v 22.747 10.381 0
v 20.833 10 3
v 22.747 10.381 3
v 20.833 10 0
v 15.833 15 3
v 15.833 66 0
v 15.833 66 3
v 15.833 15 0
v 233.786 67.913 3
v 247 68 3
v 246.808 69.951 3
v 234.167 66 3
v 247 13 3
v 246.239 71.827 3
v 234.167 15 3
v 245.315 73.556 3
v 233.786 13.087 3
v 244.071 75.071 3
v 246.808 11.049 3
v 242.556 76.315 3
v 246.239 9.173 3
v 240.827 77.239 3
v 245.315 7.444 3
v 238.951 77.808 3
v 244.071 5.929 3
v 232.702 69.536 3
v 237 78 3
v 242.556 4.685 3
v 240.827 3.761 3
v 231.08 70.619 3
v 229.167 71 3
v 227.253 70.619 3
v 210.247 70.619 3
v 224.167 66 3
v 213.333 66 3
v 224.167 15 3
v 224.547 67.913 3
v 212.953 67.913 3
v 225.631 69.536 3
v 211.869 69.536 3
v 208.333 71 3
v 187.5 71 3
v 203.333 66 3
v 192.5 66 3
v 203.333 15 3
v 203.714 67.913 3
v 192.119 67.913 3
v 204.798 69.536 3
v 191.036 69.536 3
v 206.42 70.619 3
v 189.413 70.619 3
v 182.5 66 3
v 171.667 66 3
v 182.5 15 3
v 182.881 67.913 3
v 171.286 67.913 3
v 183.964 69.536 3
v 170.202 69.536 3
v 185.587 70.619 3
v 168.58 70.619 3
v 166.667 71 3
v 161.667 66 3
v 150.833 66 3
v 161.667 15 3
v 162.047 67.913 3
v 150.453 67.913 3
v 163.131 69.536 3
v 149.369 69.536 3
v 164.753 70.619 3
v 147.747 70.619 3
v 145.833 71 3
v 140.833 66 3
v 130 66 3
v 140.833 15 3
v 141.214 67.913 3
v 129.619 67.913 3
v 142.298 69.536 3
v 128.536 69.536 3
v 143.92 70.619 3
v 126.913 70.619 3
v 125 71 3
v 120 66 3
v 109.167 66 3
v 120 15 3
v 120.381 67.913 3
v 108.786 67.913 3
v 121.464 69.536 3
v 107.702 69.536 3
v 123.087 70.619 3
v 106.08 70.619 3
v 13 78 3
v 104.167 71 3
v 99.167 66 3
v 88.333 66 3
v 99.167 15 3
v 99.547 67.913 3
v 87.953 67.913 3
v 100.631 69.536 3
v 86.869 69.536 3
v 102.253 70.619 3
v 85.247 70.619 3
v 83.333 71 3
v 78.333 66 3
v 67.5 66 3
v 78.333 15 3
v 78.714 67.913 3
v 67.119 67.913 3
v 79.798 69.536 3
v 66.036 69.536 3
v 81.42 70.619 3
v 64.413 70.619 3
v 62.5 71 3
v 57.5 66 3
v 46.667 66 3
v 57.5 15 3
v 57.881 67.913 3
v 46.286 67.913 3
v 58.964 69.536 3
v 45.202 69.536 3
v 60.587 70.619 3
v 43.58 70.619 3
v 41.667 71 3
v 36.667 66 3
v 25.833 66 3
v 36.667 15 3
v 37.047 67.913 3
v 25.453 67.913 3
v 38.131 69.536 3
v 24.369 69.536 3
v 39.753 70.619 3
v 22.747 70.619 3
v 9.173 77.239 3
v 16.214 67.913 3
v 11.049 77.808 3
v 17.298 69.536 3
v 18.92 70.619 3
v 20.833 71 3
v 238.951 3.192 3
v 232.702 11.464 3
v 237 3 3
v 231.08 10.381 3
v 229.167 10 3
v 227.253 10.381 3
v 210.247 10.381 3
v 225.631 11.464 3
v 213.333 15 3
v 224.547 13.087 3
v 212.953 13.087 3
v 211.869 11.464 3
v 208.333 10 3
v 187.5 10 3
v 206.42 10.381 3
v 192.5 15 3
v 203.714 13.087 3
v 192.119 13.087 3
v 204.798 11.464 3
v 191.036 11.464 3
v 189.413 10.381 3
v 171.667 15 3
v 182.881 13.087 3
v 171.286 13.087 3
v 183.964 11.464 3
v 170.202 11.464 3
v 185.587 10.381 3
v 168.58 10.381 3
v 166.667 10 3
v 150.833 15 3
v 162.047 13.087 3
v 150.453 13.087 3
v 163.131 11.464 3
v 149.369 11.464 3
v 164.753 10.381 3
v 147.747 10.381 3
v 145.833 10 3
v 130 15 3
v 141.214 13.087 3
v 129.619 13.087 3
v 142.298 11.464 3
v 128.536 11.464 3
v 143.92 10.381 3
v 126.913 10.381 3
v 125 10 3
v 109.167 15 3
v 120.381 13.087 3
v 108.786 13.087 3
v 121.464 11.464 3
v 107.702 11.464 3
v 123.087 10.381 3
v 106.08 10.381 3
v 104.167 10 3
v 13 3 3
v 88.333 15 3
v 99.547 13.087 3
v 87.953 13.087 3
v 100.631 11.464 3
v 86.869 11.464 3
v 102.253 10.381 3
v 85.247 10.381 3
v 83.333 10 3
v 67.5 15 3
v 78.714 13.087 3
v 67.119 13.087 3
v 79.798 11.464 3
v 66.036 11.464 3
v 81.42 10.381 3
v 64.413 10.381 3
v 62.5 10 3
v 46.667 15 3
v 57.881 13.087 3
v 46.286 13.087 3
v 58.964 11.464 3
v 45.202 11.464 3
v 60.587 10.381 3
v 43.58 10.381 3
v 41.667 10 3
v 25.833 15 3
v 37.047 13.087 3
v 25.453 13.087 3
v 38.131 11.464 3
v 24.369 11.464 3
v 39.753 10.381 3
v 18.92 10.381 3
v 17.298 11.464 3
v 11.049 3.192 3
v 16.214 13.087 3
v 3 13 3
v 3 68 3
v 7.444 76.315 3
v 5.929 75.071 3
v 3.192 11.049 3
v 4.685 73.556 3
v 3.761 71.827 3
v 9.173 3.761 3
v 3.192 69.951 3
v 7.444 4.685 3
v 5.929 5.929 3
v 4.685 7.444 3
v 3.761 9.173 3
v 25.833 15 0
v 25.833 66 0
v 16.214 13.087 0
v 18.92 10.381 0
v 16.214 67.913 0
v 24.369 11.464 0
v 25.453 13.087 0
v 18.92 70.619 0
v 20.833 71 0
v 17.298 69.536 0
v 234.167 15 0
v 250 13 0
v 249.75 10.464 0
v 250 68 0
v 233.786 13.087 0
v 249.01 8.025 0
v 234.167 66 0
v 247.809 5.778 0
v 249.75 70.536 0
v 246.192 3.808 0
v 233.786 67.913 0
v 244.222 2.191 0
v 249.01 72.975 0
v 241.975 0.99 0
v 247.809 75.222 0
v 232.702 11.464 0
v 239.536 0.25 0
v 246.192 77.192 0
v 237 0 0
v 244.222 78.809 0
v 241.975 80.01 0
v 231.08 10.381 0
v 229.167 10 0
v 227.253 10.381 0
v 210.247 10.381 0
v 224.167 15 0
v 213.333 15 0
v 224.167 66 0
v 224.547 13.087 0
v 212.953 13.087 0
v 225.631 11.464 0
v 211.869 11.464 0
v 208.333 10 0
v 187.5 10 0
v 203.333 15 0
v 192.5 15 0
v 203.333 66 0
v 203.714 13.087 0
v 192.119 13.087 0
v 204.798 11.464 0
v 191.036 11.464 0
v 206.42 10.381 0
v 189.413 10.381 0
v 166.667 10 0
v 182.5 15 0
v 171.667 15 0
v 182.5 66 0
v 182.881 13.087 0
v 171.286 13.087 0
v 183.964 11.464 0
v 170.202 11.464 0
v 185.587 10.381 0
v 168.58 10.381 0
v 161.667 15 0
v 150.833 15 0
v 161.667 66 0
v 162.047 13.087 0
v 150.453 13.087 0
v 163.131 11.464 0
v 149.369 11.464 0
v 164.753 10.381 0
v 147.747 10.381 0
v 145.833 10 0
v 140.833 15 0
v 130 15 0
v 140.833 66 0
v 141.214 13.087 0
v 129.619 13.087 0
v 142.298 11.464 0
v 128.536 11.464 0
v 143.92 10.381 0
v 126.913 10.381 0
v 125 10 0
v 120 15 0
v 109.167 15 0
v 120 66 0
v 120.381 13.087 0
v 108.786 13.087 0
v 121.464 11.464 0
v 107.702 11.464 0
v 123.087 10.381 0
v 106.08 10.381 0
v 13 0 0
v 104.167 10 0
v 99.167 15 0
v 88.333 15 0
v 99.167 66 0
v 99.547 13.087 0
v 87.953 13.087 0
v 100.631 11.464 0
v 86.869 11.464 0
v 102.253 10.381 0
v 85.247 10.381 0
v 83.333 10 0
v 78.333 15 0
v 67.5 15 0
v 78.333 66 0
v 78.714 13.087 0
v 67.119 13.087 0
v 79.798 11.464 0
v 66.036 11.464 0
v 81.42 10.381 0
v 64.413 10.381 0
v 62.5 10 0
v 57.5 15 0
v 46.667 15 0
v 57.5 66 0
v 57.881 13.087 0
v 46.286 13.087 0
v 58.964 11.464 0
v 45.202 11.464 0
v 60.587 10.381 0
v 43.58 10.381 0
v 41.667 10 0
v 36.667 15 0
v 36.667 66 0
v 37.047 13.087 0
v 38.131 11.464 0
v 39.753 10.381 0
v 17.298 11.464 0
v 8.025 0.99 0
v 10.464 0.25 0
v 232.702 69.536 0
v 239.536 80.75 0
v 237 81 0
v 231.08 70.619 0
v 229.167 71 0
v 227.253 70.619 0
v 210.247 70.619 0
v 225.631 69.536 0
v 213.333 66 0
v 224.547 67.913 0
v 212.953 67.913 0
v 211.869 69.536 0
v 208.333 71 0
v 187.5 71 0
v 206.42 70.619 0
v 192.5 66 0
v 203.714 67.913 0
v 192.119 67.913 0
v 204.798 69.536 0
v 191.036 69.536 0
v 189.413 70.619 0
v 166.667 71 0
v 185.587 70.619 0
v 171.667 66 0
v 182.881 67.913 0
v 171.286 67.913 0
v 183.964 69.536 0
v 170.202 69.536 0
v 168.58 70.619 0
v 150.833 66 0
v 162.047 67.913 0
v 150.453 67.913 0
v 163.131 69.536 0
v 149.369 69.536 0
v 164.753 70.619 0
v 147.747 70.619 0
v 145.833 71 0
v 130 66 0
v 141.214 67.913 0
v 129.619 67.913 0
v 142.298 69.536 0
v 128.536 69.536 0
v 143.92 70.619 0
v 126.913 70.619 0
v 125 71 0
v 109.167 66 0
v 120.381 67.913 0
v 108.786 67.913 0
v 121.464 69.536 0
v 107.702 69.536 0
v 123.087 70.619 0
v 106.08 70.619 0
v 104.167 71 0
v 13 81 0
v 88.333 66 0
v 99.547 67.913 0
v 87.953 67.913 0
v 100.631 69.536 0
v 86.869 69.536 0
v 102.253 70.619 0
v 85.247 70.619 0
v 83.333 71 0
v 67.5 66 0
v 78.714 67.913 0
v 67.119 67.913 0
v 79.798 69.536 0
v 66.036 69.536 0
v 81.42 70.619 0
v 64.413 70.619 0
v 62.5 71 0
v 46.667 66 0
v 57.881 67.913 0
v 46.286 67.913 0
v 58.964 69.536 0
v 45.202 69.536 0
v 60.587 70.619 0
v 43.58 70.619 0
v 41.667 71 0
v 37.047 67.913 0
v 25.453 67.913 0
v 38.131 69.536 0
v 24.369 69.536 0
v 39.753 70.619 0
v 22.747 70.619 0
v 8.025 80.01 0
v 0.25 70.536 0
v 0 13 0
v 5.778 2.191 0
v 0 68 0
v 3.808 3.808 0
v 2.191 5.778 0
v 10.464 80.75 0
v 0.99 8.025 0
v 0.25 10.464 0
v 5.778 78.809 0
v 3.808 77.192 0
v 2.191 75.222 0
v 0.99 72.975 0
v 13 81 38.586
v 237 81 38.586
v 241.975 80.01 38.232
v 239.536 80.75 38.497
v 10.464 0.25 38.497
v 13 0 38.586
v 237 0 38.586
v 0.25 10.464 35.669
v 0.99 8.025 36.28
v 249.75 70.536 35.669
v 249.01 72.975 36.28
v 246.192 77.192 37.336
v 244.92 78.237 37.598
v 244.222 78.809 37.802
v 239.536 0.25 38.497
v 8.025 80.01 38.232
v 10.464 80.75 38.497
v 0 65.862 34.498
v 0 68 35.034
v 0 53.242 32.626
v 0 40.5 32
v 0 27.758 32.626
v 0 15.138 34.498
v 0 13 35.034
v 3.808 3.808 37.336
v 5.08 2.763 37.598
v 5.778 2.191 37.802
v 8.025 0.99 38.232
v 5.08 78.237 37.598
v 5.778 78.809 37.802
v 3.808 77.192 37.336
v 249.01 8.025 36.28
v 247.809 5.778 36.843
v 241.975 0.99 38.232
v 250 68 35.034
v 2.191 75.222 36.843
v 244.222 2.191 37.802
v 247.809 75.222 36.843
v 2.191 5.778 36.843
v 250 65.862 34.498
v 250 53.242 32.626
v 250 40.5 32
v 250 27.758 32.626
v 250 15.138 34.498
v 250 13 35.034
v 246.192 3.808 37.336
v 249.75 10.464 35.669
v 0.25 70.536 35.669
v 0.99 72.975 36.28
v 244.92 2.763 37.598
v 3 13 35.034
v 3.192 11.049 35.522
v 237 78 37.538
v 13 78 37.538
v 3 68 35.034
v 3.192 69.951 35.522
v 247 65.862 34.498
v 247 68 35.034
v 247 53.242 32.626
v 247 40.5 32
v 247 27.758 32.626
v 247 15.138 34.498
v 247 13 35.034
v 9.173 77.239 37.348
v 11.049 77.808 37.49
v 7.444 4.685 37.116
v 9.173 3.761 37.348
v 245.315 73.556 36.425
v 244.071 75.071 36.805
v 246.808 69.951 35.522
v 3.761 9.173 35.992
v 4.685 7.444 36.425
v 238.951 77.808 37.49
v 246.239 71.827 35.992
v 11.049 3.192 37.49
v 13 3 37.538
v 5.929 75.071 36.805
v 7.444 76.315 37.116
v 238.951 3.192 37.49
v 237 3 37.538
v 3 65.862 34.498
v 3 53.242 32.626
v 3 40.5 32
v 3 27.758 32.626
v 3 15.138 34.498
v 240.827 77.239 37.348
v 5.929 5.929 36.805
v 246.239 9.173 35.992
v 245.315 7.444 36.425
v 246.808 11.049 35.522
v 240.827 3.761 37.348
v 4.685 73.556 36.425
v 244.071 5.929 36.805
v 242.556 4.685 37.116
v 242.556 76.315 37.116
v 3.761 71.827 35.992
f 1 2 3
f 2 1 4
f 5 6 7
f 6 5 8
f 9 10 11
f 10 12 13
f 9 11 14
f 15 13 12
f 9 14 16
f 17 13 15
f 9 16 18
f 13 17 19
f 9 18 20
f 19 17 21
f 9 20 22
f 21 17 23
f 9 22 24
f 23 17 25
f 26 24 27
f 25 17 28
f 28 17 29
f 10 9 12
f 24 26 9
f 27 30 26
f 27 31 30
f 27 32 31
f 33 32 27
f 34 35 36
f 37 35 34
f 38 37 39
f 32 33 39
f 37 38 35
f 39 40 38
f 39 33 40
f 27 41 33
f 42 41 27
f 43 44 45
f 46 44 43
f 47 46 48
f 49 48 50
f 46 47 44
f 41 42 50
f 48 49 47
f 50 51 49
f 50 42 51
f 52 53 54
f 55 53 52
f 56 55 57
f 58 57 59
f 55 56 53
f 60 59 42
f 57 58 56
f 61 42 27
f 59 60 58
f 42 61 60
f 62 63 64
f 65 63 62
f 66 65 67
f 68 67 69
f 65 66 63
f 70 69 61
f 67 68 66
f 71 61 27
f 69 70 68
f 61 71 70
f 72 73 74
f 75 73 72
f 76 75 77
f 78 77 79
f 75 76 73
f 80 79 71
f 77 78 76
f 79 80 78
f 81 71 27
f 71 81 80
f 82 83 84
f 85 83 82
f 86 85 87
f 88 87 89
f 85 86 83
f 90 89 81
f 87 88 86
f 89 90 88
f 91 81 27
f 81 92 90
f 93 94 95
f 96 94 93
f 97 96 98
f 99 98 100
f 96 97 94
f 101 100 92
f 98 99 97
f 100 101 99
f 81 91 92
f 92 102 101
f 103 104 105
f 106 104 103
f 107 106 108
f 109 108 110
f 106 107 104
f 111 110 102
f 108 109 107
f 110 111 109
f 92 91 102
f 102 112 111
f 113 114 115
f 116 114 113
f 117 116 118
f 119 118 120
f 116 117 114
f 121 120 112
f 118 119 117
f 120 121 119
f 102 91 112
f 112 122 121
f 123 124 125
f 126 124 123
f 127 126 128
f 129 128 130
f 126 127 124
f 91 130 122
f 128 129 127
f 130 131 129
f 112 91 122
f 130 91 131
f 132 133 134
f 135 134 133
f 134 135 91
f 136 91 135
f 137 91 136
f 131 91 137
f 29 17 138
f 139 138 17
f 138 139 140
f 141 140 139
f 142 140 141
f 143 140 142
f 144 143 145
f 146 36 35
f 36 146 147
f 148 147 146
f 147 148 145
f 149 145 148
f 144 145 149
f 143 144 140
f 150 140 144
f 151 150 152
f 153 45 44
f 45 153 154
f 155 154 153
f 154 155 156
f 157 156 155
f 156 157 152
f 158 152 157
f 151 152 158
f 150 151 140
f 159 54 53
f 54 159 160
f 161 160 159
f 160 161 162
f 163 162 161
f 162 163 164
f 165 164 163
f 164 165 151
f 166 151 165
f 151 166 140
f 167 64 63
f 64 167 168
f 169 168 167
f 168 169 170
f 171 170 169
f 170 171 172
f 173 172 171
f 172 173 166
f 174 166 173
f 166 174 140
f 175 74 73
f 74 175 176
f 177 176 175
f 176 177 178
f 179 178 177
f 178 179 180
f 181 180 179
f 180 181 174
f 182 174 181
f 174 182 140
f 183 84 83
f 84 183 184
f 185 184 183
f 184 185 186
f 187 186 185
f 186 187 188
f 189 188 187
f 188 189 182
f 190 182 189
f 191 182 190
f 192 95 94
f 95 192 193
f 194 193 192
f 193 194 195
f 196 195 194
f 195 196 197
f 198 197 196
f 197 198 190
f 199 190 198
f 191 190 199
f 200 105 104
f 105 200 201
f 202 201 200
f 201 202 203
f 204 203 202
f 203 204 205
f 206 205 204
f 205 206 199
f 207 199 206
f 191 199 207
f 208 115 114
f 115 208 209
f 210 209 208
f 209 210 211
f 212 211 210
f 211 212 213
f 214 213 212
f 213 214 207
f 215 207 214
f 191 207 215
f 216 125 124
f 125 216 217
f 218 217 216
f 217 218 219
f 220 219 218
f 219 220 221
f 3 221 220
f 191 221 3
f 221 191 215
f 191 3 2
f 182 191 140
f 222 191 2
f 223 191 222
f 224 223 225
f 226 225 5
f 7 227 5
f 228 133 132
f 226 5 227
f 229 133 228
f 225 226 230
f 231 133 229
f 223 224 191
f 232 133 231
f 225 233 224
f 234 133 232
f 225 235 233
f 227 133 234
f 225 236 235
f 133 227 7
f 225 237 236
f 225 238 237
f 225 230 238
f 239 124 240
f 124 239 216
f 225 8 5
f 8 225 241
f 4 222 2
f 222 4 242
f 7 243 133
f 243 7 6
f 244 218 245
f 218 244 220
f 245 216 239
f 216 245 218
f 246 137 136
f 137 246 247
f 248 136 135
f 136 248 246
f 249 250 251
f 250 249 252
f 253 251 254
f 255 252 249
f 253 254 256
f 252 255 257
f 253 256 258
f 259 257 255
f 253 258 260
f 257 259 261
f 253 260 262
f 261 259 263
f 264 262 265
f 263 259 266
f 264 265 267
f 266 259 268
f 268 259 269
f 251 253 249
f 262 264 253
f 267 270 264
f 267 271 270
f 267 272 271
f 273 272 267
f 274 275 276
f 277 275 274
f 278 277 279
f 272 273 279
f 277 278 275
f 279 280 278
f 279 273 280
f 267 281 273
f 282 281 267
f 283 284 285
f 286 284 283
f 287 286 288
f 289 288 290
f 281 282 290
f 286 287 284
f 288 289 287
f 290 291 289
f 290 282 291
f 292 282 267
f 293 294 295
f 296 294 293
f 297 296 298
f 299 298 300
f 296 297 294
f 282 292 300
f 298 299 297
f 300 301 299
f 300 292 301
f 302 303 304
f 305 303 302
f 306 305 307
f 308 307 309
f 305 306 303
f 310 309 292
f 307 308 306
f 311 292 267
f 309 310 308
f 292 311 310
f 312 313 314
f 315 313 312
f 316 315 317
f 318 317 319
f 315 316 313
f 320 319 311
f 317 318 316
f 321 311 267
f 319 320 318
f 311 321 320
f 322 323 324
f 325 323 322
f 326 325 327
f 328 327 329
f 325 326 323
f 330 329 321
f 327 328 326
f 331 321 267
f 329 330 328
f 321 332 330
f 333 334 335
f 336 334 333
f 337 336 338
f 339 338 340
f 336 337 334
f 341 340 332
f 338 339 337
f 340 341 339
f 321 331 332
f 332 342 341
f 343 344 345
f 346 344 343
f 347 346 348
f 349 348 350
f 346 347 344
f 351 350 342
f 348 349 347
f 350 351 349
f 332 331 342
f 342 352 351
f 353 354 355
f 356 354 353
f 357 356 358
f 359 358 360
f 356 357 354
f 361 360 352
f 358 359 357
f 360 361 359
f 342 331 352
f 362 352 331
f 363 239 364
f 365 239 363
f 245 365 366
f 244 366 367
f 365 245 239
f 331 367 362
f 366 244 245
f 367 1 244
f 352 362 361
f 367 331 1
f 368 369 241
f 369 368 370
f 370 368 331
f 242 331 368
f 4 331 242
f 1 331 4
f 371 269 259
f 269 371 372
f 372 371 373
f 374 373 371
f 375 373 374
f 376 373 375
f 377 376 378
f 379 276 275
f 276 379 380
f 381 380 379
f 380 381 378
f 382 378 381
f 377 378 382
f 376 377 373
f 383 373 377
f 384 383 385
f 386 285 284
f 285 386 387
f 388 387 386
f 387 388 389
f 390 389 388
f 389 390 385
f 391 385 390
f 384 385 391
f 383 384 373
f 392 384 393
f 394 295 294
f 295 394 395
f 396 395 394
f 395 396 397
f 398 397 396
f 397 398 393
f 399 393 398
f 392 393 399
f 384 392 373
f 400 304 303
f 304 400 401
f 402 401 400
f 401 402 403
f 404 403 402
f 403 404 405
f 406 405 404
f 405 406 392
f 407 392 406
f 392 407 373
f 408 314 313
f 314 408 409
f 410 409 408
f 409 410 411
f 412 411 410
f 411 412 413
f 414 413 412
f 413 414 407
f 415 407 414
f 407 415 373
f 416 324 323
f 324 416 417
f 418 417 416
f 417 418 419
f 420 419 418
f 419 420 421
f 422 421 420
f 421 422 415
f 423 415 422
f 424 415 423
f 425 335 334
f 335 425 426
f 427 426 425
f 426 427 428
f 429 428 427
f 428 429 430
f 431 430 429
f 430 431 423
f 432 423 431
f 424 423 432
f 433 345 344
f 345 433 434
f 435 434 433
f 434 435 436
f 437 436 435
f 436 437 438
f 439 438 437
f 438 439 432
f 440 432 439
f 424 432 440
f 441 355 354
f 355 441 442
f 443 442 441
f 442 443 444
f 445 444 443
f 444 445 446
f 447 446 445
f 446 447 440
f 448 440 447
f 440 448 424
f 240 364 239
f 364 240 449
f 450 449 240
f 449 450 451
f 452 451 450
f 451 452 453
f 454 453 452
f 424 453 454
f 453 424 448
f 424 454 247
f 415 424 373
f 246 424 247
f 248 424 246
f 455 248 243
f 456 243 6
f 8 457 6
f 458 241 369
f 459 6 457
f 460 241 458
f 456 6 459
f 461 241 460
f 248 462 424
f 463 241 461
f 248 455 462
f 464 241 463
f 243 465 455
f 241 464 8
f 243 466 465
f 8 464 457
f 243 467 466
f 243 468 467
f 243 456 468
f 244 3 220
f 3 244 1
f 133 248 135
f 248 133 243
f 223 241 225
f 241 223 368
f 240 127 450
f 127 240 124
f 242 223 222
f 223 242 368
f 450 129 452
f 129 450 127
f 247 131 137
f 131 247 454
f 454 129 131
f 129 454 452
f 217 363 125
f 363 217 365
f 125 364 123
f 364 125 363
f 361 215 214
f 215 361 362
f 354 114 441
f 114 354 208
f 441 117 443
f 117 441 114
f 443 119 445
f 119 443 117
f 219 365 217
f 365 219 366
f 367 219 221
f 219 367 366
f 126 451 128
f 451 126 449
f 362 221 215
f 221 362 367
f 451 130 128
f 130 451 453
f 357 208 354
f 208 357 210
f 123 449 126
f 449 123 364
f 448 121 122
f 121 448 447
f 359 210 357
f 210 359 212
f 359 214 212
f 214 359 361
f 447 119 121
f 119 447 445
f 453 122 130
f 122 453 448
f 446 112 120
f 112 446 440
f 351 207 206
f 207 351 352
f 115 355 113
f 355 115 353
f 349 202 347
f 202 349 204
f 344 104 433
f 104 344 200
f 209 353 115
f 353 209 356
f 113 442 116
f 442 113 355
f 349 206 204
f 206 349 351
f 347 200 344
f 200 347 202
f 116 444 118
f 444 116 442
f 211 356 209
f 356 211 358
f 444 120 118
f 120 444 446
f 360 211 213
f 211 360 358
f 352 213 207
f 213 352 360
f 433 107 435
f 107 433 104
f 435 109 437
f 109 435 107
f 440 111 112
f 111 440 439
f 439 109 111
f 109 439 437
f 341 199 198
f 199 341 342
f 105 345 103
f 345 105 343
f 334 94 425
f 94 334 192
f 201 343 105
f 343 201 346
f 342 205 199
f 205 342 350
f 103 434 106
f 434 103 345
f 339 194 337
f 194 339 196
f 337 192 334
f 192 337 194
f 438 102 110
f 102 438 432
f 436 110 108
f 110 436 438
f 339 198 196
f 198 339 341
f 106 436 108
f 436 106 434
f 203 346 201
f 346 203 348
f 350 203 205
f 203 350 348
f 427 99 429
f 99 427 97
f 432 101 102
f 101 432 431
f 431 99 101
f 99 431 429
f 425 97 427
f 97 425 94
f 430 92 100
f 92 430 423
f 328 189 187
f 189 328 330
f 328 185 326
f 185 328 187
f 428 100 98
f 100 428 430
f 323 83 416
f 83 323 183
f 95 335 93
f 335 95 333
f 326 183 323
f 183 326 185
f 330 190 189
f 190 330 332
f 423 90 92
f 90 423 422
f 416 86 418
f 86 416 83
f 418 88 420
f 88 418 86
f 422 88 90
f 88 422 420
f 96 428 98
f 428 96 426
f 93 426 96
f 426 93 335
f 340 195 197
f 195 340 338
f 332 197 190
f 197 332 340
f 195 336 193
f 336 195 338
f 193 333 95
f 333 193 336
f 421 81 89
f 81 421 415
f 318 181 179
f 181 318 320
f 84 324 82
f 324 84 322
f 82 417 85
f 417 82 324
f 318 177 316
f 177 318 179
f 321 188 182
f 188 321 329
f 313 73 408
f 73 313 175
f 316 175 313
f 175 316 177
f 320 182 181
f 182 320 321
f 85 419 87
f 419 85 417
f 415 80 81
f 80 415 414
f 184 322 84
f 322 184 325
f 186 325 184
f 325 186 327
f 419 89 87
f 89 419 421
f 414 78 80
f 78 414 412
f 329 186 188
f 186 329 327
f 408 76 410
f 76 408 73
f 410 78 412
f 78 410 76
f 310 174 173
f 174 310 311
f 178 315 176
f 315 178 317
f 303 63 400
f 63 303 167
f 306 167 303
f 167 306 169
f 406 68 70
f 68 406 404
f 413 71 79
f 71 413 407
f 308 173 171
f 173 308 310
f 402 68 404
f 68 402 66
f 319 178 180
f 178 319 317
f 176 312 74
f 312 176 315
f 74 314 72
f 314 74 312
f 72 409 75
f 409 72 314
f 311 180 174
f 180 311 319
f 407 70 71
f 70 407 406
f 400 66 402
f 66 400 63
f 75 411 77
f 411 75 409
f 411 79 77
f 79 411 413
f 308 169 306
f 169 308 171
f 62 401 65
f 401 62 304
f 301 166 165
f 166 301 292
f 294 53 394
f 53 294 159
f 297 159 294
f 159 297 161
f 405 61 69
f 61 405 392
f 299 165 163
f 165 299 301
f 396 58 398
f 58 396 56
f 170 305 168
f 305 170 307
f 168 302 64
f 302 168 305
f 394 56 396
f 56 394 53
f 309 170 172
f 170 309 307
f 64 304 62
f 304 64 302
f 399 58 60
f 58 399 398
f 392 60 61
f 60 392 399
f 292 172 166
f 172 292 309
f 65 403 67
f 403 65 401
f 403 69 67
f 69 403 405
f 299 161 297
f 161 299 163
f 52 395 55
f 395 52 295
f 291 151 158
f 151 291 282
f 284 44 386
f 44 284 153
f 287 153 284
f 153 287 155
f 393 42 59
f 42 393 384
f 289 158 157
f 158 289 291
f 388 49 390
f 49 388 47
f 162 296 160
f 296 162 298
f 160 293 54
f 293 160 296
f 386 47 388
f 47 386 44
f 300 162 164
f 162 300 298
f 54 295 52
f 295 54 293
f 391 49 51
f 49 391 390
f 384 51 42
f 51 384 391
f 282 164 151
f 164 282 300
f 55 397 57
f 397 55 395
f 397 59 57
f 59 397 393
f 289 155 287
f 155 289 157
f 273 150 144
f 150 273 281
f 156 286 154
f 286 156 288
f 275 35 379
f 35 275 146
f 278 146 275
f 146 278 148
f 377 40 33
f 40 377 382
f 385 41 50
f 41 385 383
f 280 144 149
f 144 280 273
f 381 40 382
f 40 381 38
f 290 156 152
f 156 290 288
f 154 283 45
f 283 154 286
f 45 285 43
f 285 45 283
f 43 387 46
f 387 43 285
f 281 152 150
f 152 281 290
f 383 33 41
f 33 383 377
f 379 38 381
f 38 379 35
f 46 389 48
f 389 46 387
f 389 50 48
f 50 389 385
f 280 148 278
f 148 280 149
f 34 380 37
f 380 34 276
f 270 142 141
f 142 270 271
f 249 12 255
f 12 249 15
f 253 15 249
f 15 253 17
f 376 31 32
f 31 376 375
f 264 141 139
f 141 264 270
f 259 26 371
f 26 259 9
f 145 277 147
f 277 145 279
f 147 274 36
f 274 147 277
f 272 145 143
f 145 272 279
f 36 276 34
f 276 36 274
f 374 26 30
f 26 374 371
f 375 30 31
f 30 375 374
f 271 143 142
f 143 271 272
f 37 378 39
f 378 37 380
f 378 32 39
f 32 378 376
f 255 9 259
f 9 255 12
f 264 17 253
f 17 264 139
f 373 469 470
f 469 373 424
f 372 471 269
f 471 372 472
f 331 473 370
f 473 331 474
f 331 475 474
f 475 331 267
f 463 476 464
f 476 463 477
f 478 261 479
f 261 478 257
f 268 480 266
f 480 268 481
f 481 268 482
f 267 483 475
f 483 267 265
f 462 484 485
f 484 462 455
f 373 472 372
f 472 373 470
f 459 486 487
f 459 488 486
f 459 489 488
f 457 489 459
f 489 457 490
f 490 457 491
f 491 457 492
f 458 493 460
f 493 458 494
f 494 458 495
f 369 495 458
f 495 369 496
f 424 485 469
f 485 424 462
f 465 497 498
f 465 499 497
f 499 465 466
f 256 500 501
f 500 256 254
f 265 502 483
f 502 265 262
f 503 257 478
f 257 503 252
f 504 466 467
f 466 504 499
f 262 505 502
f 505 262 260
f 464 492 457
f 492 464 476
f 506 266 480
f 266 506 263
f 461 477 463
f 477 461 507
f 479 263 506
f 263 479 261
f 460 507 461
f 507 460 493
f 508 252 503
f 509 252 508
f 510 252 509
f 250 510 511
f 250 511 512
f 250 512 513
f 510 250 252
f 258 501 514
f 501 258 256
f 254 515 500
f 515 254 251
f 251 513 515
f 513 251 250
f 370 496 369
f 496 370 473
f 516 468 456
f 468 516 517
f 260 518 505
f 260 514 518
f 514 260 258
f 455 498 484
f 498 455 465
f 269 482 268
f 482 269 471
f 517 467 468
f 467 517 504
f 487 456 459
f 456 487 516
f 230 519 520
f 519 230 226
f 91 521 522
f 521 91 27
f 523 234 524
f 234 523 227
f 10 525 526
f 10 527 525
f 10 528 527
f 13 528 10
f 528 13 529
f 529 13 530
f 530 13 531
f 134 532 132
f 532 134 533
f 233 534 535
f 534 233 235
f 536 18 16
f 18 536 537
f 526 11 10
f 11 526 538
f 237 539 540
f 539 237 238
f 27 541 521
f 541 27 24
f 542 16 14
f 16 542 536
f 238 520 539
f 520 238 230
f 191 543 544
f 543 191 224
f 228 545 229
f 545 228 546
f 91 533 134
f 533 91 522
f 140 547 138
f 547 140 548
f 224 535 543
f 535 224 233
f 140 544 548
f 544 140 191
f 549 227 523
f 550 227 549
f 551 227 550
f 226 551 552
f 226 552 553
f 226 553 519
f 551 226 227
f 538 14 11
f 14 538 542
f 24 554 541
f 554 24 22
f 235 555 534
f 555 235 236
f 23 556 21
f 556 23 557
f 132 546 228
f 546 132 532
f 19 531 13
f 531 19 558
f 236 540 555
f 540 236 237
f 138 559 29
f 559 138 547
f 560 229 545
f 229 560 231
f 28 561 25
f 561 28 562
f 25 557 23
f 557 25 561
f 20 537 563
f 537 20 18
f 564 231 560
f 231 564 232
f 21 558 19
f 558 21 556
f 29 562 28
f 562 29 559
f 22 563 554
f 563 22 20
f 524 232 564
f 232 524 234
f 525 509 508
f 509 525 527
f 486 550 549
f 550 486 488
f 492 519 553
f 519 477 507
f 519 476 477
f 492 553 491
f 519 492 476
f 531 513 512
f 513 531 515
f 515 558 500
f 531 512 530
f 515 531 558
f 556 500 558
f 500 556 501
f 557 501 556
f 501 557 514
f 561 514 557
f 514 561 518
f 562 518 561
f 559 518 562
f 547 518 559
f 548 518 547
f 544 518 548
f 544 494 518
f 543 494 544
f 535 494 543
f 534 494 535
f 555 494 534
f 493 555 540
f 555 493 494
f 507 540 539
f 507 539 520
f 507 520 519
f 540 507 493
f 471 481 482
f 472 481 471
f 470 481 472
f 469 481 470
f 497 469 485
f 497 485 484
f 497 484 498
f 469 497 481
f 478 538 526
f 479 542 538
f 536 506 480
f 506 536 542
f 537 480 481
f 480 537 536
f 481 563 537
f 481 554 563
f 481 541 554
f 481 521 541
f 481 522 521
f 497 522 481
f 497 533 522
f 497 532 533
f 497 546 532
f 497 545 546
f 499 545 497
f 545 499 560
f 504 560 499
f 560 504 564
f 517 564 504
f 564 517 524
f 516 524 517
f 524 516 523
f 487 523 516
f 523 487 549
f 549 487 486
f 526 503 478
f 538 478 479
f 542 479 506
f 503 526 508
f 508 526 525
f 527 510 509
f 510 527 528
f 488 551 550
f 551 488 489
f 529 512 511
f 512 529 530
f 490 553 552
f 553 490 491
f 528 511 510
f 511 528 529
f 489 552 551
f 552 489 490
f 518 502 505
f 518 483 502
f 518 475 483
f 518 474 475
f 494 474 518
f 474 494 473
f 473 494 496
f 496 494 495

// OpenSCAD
W = 250;
D = 81;
H = 45;
R = 13;
fn = 32;
thick = 3;

difference() {
    hull() {
        for(x = [R, W - R])
            for (y = [R, D - R])
                translate([x, y, 0])
                    cylinder(r = R, h = H, $fn = 32);
    }
    hull() {
        for(x = [R, W - R])
            for (y = [R, D - R])
                translate([x, y, thick])
                    cylinder(r = R - thick, h = H, $fn = 32);
    }
    for (i = [1:11]) {
        hull() {
            translate([W / 12 * i, 15, 0])
                cylinder(r = 5, h = thick, $fn = 16);
            translate([W / 12 * i, D - 15, 0])
                cylinder(r = 5, h = thick, $fn = 16);
        }
    }
    translate([0, D / 2, D * 2])
        rotate([0, 90, 0])
            cylinder(r = D * 2 - H + R, h = W, $fn = 64);
}
